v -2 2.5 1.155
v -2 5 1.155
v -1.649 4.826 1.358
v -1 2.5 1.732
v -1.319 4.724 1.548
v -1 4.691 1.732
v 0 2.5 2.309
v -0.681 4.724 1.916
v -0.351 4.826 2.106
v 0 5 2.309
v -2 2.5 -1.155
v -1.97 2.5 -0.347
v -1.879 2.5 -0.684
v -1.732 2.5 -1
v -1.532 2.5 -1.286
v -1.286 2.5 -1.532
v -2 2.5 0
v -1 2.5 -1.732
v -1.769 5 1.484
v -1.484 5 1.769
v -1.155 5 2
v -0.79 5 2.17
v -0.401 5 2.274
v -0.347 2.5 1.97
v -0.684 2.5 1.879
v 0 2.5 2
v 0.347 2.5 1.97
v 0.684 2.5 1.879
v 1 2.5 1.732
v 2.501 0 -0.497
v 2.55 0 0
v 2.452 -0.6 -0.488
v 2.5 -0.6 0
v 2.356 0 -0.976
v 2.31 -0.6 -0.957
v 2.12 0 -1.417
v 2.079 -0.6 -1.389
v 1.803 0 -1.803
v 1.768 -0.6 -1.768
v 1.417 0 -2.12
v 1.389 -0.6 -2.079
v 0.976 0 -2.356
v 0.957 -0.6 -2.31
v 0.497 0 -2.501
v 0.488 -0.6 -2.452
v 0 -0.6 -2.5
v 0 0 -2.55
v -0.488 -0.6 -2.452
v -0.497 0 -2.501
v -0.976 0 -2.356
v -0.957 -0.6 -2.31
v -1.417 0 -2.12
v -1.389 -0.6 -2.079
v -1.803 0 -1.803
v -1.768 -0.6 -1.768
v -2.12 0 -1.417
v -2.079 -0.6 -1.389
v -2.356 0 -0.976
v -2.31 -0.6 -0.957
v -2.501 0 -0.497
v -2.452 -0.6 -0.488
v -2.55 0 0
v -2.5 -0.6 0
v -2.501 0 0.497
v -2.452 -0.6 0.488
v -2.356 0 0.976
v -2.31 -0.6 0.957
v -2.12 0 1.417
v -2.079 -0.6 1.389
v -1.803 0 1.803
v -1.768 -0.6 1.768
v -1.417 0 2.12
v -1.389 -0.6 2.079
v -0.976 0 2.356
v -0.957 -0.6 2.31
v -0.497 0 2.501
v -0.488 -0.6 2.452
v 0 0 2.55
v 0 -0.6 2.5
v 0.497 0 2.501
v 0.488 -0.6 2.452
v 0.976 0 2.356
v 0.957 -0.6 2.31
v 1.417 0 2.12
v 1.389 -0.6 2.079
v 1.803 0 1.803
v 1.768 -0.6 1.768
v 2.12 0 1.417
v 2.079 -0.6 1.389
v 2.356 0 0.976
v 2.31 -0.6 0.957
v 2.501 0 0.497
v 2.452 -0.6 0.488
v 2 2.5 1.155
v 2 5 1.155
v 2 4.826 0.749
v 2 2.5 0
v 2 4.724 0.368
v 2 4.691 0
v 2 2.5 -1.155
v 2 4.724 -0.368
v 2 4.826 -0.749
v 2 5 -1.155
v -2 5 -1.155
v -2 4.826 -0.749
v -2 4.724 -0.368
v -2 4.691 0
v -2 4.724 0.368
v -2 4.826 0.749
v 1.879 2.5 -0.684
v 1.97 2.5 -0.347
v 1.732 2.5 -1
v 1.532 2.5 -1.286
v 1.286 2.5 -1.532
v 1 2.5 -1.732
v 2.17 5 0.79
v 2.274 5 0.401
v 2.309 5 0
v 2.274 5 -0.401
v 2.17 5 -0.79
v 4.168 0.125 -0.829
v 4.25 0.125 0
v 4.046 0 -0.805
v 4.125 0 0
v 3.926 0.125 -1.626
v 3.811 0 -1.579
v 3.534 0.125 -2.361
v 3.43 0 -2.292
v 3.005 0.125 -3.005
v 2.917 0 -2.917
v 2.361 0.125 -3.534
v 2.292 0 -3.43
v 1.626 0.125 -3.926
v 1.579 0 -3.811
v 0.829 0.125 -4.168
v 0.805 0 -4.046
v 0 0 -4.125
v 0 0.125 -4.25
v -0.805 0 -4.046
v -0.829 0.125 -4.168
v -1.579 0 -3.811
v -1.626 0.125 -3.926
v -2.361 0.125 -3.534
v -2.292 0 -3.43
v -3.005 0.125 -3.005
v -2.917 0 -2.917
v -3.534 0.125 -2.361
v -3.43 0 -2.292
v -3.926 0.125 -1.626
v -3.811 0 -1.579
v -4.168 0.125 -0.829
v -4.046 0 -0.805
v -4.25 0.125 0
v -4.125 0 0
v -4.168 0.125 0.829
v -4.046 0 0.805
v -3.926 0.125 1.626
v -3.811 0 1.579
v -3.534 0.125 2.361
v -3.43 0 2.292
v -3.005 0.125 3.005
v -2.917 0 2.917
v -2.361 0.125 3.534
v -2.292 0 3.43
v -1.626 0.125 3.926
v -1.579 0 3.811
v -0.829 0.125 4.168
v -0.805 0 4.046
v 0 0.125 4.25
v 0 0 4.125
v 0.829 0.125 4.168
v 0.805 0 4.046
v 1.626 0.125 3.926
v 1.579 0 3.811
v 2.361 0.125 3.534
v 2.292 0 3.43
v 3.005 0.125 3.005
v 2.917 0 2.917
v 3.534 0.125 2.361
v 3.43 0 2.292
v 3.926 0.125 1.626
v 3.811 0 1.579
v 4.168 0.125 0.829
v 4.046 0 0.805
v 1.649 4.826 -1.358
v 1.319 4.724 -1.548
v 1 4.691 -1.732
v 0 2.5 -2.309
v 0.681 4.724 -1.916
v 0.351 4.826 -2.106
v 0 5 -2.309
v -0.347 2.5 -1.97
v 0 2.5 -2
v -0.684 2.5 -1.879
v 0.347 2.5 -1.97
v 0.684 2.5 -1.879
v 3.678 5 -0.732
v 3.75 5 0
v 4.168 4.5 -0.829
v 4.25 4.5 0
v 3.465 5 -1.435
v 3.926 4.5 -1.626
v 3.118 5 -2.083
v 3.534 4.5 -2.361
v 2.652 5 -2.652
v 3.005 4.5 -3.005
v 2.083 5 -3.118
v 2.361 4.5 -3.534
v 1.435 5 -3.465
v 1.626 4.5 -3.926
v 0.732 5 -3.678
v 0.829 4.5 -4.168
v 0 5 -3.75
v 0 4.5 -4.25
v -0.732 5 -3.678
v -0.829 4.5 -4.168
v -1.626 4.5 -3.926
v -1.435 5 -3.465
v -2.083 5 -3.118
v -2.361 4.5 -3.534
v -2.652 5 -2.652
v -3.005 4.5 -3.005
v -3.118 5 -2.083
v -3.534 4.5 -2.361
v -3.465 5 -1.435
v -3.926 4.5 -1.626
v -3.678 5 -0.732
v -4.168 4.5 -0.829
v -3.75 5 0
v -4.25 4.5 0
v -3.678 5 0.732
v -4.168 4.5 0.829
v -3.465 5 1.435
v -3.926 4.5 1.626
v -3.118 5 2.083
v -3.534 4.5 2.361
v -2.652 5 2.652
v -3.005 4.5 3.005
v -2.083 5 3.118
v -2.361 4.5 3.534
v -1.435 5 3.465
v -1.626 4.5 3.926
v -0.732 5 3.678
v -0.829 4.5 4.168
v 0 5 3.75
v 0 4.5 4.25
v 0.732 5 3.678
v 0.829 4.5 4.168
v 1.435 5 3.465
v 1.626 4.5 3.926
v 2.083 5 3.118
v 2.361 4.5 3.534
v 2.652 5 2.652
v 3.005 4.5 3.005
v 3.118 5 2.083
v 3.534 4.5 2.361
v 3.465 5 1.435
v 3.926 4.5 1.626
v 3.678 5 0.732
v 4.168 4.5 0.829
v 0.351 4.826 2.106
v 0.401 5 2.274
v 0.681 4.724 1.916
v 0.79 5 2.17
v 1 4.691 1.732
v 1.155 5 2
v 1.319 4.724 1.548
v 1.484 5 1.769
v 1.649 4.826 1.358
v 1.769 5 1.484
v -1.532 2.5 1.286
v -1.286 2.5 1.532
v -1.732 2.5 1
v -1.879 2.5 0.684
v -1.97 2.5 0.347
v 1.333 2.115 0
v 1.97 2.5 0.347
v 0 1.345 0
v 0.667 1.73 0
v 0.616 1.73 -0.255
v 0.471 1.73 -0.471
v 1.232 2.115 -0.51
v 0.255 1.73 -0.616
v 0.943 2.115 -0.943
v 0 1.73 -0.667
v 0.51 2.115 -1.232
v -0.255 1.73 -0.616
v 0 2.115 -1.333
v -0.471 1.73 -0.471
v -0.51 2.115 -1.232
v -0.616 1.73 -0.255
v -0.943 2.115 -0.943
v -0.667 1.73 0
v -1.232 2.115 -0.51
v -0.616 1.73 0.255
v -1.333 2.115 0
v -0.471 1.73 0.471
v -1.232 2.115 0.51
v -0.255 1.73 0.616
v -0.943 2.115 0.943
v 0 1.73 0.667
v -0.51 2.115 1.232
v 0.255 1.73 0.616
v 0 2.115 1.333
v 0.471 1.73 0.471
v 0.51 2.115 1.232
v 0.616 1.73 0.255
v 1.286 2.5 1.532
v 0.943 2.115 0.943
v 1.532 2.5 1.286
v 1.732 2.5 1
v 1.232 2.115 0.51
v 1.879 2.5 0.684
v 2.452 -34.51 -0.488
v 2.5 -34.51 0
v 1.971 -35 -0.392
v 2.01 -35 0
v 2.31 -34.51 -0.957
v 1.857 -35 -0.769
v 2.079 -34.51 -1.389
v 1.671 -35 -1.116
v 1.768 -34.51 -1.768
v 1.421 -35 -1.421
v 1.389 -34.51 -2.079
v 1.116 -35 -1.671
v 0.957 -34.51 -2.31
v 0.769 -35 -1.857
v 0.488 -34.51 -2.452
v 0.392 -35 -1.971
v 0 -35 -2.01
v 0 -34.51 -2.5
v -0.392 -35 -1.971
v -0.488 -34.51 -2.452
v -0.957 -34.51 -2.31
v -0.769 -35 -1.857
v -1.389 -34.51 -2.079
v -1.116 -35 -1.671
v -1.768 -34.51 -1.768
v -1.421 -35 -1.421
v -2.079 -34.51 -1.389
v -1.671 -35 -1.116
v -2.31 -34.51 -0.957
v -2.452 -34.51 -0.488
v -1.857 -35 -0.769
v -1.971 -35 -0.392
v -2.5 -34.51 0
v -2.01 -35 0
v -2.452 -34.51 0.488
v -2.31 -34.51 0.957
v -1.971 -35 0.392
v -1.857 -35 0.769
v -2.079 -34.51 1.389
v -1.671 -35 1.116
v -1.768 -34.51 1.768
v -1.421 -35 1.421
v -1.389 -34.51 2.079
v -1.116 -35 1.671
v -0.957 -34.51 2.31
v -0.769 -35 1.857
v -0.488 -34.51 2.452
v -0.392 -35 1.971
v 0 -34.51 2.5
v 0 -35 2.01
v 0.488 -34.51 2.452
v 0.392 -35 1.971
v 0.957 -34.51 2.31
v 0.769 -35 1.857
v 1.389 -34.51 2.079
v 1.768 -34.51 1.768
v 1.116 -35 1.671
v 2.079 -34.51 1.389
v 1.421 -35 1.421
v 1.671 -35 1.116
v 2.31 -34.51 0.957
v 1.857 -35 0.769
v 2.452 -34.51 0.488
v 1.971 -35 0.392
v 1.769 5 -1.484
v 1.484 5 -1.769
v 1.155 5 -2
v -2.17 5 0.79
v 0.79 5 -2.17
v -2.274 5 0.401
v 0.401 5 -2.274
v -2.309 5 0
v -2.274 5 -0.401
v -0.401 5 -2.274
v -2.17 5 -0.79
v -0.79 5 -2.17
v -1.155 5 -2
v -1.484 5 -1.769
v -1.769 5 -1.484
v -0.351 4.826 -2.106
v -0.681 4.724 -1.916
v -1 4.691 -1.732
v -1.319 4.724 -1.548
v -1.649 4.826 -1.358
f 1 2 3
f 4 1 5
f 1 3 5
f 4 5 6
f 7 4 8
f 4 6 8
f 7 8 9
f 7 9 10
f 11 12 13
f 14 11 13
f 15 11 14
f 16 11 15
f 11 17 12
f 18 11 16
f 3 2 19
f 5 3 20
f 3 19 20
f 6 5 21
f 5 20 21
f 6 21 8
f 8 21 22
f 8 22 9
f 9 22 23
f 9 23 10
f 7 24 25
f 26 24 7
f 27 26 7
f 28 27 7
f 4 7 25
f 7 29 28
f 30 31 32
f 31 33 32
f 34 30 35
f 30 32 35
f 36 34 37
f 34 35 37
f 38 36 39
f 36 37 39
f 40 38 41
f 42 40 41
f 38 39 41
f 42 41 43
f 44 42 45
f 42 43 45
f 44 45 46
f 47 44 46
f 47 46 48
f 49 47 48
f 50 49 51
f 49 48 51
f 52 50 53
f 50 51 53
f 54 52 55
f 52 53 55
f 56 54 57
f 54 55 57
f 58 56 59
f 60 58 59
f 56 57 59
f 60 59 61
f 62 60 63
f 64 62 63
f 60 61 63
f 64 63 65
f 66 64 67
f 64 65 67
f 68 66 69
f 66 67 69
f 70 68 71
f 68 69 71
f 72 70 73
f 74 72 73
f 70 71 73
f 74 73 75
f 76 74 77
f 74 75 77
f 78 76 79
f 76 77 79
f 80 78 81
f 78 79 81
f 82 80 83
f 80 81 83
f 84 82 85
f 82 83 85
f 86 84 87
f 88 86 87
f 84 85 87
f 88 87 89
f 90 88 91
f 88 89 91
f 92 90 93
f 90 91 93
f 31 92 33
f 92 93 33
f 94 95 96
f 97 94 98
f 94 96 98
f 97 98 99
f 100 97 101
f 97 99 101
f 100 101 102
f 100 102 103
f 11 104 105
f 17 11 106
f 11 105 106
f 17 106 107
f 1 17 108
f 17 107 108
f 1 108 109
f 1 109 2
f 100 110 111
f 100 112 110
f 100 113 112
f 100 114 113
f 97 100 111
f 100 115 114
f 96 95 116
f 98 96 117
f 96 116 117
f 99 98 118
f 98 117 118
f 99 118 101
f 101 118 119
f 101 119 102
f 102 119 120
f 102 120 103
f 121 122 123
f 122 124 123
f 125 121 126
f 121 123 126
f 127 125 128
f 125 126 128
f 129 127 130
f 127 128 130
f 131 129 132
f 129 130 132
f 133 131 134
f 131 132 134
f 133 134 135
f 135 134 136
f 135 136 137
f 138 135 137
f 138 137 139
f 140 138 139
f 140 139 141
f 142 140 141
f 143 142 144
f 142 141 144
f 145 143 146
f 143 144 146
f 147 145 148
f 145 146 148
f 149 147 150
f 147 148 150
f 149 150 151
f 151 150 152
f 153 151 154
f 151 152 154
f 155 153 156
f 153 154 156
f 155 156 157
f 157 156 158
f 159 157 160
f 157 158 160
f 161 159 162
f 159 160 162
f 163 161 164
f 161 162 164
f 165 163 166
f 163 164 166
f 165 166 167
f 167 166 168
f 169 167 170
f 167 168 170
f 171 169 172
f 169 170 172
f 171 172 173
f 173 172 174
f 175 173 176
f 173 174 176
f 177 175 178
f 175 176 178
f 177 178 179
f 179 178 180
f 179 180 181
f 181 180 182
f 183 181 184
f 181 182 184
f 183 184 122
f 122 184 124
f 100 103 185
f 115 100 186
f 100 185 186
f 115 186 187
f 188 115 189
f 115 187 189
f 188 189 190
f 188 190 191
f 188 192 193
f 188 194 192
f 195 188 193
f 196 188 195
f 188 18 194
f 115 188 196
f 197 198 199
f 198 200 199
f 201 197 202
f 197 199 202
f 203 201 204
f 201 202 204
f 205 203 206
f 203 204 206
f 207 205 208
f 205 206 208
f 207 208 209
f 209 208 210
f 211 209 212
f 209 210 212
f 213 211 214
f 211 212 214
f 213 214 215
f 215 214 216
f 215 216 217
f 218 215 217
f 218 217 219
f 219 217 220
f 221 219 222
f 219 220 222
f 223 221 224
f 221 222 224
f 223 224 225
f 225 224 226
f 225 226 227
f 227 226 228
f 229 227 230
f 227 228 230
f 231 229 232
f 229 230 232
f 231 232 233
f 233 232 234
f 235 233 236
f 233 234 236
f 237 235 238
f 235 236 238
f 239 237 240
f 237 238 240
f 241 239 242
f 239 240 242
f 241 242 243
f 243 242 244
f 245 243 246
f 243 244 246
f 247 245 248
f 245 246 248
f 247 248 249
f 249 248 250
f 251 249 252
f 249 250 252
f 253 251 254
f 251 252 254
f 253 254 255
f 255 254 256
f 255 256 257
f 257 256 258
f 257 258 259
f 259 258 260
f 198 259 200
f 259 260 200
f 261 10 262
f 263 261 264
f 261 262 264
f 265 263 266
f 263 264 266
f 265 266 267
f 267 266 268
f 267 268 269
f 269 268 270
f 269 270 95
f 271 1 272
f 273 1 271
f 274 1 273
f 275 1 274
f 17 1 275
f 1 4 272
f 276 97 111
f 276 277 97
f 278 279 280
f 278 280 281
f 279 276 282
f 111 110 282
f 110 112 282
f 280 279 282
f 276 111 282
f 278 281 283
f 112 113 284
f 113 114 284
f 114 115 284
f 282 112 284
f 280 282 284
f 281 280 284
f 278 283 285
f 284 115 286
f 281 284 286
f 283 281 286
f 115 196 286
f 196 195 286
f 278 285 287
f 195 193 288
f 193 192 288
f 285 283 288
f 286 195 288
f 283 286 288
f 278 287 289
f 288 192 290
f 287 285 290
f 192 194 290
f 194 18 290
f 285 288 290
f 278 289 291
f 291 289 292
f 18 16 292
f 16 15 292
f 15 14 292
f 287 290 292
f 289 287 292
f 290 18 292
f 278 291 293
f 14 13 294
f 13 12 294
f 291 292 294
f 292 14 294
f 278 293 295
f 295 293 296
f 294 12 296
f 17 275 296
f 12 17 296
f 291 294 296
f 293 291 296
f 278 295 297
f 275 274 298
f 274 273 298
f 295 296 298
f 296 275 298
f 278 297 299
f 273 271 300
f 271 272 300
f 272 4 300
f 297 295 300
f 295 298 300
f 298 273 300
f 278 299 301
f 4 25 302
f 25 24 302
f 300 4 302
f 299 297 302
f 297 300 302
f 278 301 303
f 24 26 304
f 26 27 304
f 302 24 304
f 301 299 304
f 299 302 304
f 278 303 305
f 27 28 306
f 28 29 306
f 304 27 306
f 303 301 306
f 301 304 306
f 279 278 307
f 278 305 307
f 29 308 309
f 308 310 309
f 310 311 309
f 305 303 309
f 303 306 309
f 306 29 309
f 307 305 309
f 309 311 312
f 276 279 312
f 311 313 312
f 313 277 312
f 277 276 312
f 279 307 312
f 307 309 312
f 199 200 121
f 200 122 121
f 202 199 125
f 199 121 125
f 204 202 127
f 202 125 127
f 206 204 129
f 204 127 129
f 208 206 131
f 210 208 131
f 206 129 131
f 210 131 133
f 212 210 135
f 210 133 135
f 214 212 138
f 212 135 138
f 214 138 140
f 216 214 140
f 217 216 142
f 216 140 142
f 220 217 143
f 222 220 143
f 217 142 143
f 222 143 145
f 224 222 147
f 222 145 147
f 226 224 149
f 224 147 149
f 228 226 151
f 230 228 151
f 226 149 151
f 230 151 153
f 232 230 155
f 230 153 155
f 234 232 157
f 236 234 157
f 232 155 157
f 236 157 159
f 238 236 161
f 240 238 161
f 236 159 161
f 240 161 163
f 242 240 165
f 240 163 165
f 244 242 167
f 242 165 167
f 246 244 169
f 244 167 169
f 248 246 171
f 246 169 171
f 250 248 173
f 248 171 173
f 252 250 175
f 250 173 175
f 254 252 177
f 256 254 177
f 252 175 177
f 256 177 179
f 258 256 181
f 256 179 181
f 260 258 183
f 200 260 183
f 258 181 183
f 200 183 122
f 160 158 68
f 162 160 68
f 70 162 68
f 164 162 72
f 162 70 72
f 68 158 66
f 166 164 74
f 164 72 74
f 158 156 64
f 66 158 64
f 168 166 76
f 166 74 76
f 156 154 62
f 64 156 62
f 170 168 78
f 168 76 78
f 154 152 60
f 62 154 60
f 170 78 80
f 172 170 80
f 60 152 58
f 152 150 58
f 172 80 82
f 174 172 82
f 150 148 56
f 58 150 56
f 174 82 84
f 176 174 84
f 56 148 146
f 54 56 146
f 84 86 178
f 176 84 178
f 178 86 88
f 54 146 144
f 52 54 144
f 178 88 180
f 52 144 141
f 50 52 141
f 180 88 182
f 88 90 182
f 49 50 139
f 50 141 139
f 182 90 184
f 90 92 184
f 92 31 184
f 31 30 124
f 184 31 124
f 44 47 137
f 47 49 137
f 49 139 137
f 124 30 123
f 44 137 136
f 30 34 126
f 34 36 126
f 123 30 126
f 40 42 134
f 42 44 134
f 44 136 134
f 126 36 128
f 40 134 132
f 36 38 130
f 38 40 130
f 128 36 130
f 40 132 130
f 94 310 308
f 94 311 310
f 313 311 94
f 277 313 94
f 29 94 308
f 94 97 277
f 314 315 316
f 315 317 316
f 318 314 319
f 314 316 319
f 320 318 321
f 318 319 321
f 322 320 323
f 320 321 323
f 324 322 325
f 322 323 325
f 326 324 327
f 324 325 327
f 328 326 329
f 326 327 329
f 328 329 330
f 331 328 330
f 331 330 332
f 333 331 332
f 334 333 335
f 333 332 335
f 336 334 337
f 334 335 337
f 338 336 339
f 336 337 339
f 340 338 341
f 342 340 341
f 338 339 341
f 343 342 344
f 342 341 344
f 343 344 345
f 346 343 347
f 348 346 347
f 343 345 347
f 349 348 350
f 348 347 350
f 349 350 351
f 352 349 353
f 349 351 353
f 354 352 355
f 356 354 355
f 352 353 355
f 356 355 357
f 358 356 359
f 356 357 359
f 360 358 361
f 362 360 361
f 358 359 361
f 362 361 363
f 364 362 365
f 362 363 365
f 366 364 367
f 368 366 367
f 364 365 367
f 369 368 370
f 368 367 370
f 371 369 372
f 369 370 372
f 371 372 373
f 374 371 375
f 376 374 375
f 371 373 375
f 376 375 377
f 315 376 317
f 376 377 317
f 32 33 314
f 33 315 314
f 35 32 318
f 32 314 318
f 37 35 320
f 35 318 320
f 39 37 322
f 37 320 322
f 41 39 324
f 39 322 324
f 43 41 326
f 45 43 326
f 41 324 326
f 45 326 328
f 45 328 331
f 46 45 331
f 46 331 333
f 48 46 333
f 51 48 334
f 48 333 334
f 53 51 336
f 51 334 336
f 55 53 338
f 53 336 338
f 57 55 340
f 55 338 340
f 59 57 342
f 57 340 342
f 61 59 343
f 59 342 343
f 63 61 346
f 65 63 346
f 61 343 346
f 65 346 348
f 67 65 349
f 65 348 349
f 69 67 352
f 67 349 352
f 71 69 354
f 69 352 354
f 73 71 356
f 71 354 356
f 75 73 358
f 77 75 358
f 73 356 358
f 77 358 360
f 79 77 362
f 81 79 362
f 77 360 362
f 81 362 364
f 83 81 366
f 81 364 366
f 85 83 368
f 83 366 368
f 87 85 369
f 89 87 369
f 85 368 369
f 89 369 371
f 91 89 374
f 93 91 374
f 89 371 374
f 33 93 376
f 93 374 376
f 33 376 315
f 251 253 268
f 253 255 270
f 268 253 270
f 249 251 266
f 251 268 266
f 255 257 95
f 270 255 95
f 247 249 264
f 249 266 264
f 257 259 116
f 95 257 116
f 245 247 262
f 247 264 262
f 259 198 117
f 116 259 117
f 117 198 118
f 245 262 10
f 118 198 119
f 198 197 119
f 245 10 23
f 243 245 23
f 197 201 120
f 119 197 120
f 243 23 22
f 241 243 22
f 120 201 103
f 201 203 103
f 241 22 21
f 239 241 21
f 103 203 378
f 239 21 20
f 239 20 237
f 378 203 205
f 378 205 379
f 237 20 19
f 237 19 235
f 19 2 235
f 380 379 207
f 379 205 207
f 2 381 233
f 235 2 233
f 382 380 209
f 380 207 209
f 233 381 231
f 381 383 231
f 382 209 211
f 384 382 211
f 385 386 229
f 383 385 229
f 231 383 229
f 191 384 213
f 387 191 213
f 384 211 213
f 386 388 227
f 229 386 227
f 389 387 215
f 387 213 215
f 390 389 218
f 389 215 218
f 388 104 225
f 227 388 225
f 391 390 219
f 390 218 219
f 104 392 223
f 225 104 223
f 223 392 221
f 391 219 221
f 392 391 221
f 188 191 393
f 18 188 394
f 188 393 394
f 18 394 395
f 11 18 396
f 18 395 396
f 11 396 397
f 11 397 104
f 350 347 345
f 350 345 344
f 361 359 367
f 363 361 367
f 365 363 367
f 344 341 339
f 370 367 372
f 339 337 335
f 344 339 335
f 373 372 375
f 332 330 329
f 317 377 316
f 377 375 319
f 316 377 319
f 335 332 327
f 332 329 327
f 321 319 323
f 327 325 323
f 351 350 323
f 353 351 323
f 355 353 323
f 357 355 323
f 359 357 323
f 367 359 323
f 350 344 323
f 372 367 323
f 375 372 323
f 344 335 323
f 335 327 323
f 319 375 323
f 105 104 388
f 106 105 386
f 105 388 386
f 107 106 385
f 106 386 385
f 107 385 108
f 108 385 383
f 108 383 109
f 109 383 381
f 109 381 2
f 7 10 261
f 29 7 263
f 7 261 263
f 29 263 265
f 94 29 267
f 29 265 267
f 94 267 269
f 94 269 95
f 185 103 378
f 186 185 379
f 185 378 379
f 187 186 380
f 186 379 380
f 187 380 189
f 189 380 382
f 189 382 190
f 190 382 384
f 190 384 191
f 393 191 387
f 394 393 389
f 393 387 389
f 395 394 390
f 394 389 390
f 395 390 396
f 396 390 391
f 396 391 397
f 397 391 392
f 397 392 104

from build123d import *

# Parameters (mm, degrees)
CUT_EXTRUDE1_DEPTH = 2.5


with BuildPart() as part:
    # Sketch1 → Revolve1 (revolve)
    with BuildSketch(Plane.XY):
        Polygon((0, 1.345299462), (2, 2.5), (2, 4.690598923), (2.309401077, 5), (3.75, 5), (4.25, 4.5), (4.25, 0.125), (4.125, 0), (2.55, 0), (2.5, -0.6), (2.5, -34.5095), (2.0095, -35), (0, -35), align=None)
    revolve(axis=Axis((0, -35, 0), (0, 1, 0)))

    # Sketch2 → Cut-Extrude1 (cut)
    with BuildSketch(Plane(origin=(0, 5, 0), x_dir=(1, 0, 0), z_dir=(0, 1, 0))):
        Polygon((-2, -1.154700538), (0, -2.309401077), (2, -1.154700538), (2, 1.154700538), (0, 2.309401077), (-2, 1.154700538), align=None)
    extrude(amount=-CUT_EXTRUDE1_DEPTH, mode=Mode.SUBTRACT)


solid = part.part
